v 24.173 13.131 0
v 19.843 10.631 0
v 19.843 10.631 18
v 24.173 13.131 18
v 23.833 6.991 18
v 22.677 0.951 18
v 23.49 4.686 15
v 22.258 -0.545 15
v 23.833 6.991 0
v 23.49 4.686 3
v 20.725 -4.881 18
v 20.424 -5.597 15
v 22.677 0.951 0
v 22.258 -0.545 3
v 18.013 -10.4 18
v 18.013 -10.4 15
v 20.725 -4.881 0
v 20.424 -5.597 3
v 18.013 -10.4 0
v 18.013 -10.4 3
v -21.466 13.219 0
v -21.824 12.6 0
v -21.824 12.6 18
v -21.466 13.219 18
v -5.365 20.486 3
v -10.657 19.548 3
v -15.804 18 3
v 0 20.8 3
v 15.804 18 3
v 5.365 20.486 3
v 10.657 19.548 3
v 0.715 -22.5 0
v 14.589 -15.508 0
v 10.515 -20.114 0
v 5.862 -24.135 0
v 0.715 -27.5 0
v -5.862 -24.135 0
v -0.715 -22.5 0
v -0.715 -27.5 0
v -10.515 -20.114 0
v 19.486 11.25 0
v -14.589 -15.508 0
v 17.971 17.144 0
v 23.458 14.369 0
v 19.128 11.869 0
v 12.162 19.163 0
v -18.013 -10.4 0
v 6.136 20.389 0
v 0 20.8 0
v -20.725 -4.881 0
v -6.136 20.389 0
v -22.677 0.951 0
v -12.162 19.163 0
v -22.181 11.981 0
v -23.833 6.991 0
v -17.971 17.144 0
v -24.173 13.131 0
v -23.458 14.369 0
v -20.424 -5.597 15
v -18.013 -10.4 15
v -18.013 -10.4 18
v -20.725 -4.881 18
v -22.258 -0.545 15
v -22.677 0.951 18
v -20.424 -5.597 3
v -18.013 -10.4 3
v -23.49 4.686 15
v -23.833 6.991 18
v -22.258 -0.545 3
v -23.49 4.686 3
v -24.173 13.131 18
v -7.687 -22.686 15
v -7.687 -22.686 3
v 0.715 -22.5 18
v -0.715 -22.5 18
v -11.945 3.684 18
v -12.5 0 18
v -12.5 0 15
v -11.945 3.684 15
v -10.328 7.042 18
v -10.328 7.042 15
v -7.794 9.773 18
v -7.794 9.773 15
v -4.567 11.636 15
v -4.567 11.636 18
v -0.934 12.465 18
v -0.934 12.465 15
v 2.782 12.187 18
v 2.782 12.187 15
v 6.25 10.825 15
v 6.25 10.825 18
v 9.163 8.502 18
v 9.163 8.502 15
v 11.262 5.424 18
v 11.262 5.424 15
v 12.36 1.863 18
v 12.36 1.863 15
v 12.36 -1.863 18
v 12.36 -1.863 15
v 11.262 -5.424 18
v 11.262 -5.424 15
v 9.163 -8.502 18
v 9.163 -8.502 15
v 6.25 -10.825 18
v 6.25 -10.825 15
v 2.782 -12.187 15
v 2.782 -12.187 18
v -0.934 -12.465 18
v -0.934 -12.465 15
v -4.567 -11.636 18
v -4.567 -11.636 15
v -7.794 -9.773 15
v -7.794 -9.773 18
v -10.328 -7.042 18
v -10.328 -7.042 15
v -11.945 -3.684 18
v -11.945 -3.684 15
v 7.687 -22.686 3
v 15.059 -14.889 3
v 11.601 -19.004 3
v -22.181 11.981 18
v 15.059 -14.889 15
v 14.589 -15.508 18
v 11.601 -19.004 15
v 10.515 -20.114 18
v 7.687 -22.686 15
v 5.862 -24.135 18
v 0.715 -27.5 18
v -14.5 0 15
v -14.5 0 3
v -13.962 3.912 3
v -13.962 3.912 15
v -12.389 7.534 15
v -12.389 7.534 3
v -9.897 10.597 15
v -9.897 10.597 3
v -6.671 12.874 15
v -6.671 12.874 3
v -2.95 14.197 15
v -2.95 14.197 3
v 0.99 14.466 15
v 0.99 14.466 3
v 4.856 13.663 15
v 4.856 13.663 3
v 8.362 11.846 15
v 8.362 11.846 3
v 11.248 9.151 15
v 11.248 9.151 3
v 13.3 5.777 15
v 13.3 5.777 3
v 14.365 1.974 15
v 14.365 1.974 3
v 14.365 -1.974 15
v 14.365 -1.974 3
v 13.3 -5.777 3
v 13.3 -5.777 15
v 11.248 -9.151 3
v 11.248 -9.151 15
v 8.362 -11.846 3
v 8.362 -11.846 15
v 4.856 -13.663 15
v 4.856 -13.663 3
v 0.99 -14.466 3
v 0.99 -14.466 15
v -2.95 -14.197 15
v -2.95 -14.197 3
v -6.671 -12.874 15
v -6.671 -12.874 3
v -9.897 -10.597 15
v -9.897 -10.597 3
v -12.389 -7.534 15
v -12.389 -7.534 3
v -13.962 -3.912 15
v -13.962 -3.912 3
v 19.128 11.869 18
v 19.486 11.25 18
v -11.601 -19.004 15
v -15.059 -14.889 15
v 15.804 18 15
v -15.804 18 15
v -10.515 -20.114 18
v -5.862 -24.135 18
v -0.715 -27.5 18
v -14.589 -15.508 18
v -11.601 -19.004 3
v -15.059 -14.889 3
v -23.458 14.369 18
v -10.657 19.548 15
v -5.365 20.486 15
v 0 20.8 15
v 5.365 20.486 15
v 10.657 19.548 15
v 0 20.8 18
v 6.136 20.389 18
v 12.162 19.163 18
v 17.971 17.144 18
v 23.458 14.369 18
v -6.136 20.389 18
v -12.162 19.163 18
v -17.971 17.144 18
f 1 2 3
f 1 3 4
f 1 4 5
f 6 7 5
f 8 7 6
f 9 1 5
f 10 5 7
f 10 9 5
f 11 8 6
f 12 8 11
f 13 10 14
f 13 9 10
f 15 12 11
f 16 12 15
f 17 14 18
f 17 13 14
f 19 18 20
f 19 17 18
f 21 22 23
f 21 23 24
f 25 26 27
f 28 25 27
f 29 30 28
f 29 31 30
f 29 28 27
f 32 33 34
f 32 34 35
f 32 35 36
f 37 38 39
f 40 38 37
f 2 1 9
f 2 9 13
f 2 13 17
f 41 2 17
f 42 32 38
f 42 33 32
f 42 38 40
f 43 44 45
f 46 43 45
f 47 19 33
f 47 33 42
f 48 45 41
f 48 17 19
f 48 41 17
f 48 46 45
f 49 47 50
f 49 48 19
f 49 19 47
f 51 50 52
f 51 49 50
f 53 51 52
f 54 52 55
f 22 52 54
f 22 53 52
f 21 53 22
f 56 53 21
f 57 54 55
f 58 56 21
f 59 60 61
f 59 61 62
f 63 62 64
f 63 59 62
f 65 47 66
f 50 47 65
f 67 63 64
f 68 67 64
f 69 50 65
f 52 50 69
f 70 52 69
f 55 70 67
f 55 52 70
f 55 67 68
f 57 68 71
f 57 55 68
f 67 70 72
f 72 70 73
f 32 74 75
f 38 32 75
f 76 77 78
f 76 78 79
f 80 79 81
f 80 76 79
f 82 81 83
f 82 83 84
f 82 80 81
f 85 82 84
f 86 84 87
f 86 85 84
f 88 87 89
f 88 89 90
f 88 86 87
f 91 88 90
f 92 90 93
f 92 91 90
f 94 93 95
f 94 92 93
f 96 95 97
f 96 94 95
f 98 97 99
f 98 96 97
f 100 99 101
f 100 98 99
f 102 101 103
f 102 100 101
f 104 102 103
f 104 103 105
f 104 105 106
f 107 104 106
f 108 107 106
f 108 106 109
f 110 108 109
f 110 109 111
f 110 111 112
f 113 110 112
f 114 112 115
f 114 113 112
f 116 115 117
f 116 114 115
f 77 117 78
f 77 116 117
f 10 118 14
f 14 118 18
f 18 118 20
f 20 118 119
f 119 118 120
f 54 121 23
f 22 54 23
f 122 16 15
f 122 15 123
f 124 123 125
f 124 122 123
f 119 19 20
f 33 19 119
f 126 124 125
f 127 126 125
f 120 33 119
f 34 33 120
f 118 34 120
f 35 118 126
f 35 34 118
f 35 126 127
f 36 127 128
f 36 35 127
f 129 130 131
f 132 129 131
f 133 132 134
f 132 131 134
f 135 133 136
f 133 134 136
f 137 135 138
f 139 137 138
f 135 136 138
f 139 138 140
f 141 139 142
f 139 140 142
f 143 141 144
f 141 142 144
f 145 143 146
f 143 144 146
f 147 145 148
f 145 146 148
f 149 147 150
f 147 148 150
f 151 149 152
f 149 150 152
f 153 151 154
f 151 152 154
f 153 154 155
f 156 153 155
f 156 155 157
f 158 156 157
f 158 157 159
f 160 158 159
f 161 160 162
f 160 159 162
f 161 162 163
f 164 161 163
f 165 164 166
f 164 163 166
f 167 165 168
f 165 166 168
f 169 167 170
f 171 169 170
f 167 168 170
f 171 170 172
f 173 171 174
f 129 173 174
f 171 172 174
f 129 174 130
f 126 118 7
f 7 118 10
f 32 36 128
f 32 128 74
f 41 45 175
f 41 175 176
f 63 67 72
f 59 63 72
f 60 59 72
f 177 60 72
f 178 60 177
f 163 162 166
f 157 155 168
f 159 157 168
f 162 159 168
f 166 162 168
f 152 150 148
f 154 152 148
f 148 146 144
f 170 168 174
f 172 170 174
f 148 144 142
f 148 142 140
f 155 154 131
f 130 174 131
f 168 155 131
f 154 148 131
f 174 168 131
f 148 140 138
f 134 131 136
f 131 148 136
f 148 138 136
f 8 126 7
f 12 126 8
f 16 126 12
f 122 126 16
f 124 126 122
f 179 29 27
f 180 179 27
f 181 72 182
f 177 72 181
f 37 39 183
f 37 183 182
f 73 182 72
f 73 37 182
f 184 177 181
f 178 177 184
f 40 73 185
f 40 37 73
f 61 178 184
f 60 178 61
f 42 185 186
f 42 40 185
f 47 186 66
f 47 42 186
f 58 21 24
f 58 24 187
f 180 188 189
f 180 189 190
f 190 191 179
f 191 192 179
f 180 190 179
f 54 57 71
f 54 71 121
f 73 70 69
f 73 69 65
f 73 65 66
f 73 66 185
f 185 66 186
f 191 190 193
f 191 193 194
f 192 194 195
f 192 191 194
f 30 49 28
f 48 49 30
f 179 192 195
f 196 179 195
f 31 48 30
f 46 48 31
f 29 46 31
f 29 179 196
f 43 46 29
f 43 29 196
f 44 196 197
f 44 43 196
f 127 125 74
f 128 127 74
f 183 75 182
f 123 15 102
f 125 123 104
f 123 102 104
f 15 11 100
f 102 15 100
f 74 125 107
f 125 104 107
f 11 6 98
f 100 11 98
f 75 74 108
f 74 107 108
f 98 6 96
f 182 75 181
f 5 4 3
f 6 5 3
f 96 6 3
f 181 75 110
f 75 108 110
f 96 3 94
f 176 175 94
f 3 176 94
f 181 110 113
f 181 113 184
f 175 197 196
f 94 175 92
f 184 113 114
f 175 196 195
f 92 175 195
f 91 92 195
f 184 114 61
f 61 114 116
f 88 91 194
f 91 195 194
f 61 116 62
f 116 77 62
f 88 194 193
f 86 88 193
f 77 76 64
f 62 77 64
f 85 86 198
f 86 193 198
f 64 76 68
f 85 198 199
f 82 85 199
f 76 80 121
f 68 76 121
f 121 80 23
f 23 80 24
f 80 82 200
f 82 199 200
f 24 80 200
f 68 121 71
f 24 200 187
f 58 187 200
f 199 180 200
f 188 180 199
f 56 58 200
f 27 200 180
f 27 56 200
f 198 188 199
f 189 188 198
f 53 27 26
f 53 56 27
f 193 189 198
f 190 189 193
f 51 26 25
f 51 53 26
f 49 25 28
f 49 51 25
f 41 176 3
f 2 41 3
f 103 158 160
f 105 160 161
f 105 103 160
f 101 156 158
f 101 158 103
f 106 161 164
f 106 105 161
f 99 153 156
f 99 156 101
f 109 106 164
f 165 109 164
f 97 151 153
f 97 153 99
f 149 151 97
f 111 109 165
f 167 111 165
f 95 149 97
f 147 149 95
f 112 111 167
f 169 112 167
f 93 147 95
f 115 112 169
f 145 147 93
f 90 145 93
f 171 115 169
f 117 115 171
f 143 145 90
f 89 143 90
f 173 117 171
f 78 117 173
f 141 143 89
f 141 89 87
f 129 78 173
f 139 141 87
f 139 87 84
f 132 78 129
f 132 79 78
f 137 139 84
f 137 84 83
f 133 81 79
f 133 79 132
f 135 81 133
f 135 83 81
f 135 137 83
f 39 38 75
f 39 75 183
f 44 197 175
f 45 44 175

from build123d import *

# Parameters (mm, degrees)
BASE_EXTRUDE_DEPTH           = 18
COMBUSTION_CHAMBER_PROFILE_R = 14.5
CUT_EXTRUDE1_DEPTH           = 12
SKETCH6_R                    = 12.5
CUT_EXTRUDE5_DEPTH           = 3


with BuildPart() as part:
    # rotor profile → Base-Extrude (new body)
    with BuildSketch(Plane.XY):
        with BuildLine():
            Line((-24.173095267, 13.130970823), (-22.181236737, 11.980970764))
            Line((-22.181236737, 11.980970764), (-21.823840171, 12.599999774))
            Line((-21.823840171, 12.599999774), (-21.466443413, 13.219029117))
            Line((-21.466443413, 13.219029117), (-23.458301944, 14.369029176))
            ThreePointArc((-23.458301944, 14.369029176), (-12.161921269, 19.163134144), (0, 20.8))
            ThreePointArc((0, 20.8), (12.161921269, 19.163134144), (23.458301944, 14.369029176))
            Line((23.458301944, 14.369029176), (19.128174925, 11.869029176))
            Line((19.128174925, 11.869029176), (19.485571586, 11.249999999))
            Line((19.485571586, 11.249999999), (19.842968249, 10.630970821))
            Line((19.842968249, 10.630970821), (24.173095268, 13.130970821))
            ThreePointArc((24.173095268, 13.130970821), (22.676721692, 0.95096574), (18.013328561, -10.399999953))
            ThreePointArc((18.013328561, -10.399999953), (10.514800547, -20.114099885), (0.714793524, -27.500000115))
            Line((0.714793524, -27.500000115), (0.714793524, -22.500000115))
            Line((0.714793524, -22.500000115), (0, -22.500000115))
            Line((0, -22.500000115), (-0.714793848, -22.500000115))
            Line((-0.714793848, -22.500000115), (-0.714793848, -27.500000115))
            ThreePointArc((-0.714793848, -27.500000115), (-10.514800813, -20.114099941), (-18.013328717, -10.400000004))
            ThreePointArc((-18.013328717, -10.400000004), (-22.676721717, 0.95096574), (-24.173095267, 13.130970823))
        make_face()
    extrude(amount=BASE_EXTRUDE_DEPTH)

    # combustion chamber profile → Cut-Extrude1 (cut)
    with BuildSketch(Plane(origin=(0, 0, 3), x_dir=(-1, 0, 0), z_dir=(0, 0, -1))):
        Circle(COMBUSTION_CHAMBER_PROFILE_R)
        Polygon((18, 21), (18, 18), (0, 18), (-18, 18), (-18, 21), align=None)
        Polygon((-9.186533479, -26.088457268), (-27.186533479, 5.088457268), (-24.588457268, 6.588457268), (-15.588457268, -9), (-6.588457268, -24.588457268), align=None)
        Polygon((27.186533479, 5.088457268), (9.186533479, -26.088457268), (6.588457268, -24.588457268), (15.588457268, -9), (24.588457268, 6.588457268), align=None)
    extrude(amount=-CUT_EXTRUDE1_DEPTH, mode=Mode.SUBTRACT)

    # Sketch6 → Cut-Extrude5 (cut)
    with BuildSketch(Plane(origin=(0, 0, 18), x_dir=(-1, 0, 0), z_dir=(0, 0, -1))):
        Circle(SKETCH6_R)
    extrude(amount=CUT_EXTRUDE5_DEPTH, mode=Mode.SUBTRACT)


solid = part.part
